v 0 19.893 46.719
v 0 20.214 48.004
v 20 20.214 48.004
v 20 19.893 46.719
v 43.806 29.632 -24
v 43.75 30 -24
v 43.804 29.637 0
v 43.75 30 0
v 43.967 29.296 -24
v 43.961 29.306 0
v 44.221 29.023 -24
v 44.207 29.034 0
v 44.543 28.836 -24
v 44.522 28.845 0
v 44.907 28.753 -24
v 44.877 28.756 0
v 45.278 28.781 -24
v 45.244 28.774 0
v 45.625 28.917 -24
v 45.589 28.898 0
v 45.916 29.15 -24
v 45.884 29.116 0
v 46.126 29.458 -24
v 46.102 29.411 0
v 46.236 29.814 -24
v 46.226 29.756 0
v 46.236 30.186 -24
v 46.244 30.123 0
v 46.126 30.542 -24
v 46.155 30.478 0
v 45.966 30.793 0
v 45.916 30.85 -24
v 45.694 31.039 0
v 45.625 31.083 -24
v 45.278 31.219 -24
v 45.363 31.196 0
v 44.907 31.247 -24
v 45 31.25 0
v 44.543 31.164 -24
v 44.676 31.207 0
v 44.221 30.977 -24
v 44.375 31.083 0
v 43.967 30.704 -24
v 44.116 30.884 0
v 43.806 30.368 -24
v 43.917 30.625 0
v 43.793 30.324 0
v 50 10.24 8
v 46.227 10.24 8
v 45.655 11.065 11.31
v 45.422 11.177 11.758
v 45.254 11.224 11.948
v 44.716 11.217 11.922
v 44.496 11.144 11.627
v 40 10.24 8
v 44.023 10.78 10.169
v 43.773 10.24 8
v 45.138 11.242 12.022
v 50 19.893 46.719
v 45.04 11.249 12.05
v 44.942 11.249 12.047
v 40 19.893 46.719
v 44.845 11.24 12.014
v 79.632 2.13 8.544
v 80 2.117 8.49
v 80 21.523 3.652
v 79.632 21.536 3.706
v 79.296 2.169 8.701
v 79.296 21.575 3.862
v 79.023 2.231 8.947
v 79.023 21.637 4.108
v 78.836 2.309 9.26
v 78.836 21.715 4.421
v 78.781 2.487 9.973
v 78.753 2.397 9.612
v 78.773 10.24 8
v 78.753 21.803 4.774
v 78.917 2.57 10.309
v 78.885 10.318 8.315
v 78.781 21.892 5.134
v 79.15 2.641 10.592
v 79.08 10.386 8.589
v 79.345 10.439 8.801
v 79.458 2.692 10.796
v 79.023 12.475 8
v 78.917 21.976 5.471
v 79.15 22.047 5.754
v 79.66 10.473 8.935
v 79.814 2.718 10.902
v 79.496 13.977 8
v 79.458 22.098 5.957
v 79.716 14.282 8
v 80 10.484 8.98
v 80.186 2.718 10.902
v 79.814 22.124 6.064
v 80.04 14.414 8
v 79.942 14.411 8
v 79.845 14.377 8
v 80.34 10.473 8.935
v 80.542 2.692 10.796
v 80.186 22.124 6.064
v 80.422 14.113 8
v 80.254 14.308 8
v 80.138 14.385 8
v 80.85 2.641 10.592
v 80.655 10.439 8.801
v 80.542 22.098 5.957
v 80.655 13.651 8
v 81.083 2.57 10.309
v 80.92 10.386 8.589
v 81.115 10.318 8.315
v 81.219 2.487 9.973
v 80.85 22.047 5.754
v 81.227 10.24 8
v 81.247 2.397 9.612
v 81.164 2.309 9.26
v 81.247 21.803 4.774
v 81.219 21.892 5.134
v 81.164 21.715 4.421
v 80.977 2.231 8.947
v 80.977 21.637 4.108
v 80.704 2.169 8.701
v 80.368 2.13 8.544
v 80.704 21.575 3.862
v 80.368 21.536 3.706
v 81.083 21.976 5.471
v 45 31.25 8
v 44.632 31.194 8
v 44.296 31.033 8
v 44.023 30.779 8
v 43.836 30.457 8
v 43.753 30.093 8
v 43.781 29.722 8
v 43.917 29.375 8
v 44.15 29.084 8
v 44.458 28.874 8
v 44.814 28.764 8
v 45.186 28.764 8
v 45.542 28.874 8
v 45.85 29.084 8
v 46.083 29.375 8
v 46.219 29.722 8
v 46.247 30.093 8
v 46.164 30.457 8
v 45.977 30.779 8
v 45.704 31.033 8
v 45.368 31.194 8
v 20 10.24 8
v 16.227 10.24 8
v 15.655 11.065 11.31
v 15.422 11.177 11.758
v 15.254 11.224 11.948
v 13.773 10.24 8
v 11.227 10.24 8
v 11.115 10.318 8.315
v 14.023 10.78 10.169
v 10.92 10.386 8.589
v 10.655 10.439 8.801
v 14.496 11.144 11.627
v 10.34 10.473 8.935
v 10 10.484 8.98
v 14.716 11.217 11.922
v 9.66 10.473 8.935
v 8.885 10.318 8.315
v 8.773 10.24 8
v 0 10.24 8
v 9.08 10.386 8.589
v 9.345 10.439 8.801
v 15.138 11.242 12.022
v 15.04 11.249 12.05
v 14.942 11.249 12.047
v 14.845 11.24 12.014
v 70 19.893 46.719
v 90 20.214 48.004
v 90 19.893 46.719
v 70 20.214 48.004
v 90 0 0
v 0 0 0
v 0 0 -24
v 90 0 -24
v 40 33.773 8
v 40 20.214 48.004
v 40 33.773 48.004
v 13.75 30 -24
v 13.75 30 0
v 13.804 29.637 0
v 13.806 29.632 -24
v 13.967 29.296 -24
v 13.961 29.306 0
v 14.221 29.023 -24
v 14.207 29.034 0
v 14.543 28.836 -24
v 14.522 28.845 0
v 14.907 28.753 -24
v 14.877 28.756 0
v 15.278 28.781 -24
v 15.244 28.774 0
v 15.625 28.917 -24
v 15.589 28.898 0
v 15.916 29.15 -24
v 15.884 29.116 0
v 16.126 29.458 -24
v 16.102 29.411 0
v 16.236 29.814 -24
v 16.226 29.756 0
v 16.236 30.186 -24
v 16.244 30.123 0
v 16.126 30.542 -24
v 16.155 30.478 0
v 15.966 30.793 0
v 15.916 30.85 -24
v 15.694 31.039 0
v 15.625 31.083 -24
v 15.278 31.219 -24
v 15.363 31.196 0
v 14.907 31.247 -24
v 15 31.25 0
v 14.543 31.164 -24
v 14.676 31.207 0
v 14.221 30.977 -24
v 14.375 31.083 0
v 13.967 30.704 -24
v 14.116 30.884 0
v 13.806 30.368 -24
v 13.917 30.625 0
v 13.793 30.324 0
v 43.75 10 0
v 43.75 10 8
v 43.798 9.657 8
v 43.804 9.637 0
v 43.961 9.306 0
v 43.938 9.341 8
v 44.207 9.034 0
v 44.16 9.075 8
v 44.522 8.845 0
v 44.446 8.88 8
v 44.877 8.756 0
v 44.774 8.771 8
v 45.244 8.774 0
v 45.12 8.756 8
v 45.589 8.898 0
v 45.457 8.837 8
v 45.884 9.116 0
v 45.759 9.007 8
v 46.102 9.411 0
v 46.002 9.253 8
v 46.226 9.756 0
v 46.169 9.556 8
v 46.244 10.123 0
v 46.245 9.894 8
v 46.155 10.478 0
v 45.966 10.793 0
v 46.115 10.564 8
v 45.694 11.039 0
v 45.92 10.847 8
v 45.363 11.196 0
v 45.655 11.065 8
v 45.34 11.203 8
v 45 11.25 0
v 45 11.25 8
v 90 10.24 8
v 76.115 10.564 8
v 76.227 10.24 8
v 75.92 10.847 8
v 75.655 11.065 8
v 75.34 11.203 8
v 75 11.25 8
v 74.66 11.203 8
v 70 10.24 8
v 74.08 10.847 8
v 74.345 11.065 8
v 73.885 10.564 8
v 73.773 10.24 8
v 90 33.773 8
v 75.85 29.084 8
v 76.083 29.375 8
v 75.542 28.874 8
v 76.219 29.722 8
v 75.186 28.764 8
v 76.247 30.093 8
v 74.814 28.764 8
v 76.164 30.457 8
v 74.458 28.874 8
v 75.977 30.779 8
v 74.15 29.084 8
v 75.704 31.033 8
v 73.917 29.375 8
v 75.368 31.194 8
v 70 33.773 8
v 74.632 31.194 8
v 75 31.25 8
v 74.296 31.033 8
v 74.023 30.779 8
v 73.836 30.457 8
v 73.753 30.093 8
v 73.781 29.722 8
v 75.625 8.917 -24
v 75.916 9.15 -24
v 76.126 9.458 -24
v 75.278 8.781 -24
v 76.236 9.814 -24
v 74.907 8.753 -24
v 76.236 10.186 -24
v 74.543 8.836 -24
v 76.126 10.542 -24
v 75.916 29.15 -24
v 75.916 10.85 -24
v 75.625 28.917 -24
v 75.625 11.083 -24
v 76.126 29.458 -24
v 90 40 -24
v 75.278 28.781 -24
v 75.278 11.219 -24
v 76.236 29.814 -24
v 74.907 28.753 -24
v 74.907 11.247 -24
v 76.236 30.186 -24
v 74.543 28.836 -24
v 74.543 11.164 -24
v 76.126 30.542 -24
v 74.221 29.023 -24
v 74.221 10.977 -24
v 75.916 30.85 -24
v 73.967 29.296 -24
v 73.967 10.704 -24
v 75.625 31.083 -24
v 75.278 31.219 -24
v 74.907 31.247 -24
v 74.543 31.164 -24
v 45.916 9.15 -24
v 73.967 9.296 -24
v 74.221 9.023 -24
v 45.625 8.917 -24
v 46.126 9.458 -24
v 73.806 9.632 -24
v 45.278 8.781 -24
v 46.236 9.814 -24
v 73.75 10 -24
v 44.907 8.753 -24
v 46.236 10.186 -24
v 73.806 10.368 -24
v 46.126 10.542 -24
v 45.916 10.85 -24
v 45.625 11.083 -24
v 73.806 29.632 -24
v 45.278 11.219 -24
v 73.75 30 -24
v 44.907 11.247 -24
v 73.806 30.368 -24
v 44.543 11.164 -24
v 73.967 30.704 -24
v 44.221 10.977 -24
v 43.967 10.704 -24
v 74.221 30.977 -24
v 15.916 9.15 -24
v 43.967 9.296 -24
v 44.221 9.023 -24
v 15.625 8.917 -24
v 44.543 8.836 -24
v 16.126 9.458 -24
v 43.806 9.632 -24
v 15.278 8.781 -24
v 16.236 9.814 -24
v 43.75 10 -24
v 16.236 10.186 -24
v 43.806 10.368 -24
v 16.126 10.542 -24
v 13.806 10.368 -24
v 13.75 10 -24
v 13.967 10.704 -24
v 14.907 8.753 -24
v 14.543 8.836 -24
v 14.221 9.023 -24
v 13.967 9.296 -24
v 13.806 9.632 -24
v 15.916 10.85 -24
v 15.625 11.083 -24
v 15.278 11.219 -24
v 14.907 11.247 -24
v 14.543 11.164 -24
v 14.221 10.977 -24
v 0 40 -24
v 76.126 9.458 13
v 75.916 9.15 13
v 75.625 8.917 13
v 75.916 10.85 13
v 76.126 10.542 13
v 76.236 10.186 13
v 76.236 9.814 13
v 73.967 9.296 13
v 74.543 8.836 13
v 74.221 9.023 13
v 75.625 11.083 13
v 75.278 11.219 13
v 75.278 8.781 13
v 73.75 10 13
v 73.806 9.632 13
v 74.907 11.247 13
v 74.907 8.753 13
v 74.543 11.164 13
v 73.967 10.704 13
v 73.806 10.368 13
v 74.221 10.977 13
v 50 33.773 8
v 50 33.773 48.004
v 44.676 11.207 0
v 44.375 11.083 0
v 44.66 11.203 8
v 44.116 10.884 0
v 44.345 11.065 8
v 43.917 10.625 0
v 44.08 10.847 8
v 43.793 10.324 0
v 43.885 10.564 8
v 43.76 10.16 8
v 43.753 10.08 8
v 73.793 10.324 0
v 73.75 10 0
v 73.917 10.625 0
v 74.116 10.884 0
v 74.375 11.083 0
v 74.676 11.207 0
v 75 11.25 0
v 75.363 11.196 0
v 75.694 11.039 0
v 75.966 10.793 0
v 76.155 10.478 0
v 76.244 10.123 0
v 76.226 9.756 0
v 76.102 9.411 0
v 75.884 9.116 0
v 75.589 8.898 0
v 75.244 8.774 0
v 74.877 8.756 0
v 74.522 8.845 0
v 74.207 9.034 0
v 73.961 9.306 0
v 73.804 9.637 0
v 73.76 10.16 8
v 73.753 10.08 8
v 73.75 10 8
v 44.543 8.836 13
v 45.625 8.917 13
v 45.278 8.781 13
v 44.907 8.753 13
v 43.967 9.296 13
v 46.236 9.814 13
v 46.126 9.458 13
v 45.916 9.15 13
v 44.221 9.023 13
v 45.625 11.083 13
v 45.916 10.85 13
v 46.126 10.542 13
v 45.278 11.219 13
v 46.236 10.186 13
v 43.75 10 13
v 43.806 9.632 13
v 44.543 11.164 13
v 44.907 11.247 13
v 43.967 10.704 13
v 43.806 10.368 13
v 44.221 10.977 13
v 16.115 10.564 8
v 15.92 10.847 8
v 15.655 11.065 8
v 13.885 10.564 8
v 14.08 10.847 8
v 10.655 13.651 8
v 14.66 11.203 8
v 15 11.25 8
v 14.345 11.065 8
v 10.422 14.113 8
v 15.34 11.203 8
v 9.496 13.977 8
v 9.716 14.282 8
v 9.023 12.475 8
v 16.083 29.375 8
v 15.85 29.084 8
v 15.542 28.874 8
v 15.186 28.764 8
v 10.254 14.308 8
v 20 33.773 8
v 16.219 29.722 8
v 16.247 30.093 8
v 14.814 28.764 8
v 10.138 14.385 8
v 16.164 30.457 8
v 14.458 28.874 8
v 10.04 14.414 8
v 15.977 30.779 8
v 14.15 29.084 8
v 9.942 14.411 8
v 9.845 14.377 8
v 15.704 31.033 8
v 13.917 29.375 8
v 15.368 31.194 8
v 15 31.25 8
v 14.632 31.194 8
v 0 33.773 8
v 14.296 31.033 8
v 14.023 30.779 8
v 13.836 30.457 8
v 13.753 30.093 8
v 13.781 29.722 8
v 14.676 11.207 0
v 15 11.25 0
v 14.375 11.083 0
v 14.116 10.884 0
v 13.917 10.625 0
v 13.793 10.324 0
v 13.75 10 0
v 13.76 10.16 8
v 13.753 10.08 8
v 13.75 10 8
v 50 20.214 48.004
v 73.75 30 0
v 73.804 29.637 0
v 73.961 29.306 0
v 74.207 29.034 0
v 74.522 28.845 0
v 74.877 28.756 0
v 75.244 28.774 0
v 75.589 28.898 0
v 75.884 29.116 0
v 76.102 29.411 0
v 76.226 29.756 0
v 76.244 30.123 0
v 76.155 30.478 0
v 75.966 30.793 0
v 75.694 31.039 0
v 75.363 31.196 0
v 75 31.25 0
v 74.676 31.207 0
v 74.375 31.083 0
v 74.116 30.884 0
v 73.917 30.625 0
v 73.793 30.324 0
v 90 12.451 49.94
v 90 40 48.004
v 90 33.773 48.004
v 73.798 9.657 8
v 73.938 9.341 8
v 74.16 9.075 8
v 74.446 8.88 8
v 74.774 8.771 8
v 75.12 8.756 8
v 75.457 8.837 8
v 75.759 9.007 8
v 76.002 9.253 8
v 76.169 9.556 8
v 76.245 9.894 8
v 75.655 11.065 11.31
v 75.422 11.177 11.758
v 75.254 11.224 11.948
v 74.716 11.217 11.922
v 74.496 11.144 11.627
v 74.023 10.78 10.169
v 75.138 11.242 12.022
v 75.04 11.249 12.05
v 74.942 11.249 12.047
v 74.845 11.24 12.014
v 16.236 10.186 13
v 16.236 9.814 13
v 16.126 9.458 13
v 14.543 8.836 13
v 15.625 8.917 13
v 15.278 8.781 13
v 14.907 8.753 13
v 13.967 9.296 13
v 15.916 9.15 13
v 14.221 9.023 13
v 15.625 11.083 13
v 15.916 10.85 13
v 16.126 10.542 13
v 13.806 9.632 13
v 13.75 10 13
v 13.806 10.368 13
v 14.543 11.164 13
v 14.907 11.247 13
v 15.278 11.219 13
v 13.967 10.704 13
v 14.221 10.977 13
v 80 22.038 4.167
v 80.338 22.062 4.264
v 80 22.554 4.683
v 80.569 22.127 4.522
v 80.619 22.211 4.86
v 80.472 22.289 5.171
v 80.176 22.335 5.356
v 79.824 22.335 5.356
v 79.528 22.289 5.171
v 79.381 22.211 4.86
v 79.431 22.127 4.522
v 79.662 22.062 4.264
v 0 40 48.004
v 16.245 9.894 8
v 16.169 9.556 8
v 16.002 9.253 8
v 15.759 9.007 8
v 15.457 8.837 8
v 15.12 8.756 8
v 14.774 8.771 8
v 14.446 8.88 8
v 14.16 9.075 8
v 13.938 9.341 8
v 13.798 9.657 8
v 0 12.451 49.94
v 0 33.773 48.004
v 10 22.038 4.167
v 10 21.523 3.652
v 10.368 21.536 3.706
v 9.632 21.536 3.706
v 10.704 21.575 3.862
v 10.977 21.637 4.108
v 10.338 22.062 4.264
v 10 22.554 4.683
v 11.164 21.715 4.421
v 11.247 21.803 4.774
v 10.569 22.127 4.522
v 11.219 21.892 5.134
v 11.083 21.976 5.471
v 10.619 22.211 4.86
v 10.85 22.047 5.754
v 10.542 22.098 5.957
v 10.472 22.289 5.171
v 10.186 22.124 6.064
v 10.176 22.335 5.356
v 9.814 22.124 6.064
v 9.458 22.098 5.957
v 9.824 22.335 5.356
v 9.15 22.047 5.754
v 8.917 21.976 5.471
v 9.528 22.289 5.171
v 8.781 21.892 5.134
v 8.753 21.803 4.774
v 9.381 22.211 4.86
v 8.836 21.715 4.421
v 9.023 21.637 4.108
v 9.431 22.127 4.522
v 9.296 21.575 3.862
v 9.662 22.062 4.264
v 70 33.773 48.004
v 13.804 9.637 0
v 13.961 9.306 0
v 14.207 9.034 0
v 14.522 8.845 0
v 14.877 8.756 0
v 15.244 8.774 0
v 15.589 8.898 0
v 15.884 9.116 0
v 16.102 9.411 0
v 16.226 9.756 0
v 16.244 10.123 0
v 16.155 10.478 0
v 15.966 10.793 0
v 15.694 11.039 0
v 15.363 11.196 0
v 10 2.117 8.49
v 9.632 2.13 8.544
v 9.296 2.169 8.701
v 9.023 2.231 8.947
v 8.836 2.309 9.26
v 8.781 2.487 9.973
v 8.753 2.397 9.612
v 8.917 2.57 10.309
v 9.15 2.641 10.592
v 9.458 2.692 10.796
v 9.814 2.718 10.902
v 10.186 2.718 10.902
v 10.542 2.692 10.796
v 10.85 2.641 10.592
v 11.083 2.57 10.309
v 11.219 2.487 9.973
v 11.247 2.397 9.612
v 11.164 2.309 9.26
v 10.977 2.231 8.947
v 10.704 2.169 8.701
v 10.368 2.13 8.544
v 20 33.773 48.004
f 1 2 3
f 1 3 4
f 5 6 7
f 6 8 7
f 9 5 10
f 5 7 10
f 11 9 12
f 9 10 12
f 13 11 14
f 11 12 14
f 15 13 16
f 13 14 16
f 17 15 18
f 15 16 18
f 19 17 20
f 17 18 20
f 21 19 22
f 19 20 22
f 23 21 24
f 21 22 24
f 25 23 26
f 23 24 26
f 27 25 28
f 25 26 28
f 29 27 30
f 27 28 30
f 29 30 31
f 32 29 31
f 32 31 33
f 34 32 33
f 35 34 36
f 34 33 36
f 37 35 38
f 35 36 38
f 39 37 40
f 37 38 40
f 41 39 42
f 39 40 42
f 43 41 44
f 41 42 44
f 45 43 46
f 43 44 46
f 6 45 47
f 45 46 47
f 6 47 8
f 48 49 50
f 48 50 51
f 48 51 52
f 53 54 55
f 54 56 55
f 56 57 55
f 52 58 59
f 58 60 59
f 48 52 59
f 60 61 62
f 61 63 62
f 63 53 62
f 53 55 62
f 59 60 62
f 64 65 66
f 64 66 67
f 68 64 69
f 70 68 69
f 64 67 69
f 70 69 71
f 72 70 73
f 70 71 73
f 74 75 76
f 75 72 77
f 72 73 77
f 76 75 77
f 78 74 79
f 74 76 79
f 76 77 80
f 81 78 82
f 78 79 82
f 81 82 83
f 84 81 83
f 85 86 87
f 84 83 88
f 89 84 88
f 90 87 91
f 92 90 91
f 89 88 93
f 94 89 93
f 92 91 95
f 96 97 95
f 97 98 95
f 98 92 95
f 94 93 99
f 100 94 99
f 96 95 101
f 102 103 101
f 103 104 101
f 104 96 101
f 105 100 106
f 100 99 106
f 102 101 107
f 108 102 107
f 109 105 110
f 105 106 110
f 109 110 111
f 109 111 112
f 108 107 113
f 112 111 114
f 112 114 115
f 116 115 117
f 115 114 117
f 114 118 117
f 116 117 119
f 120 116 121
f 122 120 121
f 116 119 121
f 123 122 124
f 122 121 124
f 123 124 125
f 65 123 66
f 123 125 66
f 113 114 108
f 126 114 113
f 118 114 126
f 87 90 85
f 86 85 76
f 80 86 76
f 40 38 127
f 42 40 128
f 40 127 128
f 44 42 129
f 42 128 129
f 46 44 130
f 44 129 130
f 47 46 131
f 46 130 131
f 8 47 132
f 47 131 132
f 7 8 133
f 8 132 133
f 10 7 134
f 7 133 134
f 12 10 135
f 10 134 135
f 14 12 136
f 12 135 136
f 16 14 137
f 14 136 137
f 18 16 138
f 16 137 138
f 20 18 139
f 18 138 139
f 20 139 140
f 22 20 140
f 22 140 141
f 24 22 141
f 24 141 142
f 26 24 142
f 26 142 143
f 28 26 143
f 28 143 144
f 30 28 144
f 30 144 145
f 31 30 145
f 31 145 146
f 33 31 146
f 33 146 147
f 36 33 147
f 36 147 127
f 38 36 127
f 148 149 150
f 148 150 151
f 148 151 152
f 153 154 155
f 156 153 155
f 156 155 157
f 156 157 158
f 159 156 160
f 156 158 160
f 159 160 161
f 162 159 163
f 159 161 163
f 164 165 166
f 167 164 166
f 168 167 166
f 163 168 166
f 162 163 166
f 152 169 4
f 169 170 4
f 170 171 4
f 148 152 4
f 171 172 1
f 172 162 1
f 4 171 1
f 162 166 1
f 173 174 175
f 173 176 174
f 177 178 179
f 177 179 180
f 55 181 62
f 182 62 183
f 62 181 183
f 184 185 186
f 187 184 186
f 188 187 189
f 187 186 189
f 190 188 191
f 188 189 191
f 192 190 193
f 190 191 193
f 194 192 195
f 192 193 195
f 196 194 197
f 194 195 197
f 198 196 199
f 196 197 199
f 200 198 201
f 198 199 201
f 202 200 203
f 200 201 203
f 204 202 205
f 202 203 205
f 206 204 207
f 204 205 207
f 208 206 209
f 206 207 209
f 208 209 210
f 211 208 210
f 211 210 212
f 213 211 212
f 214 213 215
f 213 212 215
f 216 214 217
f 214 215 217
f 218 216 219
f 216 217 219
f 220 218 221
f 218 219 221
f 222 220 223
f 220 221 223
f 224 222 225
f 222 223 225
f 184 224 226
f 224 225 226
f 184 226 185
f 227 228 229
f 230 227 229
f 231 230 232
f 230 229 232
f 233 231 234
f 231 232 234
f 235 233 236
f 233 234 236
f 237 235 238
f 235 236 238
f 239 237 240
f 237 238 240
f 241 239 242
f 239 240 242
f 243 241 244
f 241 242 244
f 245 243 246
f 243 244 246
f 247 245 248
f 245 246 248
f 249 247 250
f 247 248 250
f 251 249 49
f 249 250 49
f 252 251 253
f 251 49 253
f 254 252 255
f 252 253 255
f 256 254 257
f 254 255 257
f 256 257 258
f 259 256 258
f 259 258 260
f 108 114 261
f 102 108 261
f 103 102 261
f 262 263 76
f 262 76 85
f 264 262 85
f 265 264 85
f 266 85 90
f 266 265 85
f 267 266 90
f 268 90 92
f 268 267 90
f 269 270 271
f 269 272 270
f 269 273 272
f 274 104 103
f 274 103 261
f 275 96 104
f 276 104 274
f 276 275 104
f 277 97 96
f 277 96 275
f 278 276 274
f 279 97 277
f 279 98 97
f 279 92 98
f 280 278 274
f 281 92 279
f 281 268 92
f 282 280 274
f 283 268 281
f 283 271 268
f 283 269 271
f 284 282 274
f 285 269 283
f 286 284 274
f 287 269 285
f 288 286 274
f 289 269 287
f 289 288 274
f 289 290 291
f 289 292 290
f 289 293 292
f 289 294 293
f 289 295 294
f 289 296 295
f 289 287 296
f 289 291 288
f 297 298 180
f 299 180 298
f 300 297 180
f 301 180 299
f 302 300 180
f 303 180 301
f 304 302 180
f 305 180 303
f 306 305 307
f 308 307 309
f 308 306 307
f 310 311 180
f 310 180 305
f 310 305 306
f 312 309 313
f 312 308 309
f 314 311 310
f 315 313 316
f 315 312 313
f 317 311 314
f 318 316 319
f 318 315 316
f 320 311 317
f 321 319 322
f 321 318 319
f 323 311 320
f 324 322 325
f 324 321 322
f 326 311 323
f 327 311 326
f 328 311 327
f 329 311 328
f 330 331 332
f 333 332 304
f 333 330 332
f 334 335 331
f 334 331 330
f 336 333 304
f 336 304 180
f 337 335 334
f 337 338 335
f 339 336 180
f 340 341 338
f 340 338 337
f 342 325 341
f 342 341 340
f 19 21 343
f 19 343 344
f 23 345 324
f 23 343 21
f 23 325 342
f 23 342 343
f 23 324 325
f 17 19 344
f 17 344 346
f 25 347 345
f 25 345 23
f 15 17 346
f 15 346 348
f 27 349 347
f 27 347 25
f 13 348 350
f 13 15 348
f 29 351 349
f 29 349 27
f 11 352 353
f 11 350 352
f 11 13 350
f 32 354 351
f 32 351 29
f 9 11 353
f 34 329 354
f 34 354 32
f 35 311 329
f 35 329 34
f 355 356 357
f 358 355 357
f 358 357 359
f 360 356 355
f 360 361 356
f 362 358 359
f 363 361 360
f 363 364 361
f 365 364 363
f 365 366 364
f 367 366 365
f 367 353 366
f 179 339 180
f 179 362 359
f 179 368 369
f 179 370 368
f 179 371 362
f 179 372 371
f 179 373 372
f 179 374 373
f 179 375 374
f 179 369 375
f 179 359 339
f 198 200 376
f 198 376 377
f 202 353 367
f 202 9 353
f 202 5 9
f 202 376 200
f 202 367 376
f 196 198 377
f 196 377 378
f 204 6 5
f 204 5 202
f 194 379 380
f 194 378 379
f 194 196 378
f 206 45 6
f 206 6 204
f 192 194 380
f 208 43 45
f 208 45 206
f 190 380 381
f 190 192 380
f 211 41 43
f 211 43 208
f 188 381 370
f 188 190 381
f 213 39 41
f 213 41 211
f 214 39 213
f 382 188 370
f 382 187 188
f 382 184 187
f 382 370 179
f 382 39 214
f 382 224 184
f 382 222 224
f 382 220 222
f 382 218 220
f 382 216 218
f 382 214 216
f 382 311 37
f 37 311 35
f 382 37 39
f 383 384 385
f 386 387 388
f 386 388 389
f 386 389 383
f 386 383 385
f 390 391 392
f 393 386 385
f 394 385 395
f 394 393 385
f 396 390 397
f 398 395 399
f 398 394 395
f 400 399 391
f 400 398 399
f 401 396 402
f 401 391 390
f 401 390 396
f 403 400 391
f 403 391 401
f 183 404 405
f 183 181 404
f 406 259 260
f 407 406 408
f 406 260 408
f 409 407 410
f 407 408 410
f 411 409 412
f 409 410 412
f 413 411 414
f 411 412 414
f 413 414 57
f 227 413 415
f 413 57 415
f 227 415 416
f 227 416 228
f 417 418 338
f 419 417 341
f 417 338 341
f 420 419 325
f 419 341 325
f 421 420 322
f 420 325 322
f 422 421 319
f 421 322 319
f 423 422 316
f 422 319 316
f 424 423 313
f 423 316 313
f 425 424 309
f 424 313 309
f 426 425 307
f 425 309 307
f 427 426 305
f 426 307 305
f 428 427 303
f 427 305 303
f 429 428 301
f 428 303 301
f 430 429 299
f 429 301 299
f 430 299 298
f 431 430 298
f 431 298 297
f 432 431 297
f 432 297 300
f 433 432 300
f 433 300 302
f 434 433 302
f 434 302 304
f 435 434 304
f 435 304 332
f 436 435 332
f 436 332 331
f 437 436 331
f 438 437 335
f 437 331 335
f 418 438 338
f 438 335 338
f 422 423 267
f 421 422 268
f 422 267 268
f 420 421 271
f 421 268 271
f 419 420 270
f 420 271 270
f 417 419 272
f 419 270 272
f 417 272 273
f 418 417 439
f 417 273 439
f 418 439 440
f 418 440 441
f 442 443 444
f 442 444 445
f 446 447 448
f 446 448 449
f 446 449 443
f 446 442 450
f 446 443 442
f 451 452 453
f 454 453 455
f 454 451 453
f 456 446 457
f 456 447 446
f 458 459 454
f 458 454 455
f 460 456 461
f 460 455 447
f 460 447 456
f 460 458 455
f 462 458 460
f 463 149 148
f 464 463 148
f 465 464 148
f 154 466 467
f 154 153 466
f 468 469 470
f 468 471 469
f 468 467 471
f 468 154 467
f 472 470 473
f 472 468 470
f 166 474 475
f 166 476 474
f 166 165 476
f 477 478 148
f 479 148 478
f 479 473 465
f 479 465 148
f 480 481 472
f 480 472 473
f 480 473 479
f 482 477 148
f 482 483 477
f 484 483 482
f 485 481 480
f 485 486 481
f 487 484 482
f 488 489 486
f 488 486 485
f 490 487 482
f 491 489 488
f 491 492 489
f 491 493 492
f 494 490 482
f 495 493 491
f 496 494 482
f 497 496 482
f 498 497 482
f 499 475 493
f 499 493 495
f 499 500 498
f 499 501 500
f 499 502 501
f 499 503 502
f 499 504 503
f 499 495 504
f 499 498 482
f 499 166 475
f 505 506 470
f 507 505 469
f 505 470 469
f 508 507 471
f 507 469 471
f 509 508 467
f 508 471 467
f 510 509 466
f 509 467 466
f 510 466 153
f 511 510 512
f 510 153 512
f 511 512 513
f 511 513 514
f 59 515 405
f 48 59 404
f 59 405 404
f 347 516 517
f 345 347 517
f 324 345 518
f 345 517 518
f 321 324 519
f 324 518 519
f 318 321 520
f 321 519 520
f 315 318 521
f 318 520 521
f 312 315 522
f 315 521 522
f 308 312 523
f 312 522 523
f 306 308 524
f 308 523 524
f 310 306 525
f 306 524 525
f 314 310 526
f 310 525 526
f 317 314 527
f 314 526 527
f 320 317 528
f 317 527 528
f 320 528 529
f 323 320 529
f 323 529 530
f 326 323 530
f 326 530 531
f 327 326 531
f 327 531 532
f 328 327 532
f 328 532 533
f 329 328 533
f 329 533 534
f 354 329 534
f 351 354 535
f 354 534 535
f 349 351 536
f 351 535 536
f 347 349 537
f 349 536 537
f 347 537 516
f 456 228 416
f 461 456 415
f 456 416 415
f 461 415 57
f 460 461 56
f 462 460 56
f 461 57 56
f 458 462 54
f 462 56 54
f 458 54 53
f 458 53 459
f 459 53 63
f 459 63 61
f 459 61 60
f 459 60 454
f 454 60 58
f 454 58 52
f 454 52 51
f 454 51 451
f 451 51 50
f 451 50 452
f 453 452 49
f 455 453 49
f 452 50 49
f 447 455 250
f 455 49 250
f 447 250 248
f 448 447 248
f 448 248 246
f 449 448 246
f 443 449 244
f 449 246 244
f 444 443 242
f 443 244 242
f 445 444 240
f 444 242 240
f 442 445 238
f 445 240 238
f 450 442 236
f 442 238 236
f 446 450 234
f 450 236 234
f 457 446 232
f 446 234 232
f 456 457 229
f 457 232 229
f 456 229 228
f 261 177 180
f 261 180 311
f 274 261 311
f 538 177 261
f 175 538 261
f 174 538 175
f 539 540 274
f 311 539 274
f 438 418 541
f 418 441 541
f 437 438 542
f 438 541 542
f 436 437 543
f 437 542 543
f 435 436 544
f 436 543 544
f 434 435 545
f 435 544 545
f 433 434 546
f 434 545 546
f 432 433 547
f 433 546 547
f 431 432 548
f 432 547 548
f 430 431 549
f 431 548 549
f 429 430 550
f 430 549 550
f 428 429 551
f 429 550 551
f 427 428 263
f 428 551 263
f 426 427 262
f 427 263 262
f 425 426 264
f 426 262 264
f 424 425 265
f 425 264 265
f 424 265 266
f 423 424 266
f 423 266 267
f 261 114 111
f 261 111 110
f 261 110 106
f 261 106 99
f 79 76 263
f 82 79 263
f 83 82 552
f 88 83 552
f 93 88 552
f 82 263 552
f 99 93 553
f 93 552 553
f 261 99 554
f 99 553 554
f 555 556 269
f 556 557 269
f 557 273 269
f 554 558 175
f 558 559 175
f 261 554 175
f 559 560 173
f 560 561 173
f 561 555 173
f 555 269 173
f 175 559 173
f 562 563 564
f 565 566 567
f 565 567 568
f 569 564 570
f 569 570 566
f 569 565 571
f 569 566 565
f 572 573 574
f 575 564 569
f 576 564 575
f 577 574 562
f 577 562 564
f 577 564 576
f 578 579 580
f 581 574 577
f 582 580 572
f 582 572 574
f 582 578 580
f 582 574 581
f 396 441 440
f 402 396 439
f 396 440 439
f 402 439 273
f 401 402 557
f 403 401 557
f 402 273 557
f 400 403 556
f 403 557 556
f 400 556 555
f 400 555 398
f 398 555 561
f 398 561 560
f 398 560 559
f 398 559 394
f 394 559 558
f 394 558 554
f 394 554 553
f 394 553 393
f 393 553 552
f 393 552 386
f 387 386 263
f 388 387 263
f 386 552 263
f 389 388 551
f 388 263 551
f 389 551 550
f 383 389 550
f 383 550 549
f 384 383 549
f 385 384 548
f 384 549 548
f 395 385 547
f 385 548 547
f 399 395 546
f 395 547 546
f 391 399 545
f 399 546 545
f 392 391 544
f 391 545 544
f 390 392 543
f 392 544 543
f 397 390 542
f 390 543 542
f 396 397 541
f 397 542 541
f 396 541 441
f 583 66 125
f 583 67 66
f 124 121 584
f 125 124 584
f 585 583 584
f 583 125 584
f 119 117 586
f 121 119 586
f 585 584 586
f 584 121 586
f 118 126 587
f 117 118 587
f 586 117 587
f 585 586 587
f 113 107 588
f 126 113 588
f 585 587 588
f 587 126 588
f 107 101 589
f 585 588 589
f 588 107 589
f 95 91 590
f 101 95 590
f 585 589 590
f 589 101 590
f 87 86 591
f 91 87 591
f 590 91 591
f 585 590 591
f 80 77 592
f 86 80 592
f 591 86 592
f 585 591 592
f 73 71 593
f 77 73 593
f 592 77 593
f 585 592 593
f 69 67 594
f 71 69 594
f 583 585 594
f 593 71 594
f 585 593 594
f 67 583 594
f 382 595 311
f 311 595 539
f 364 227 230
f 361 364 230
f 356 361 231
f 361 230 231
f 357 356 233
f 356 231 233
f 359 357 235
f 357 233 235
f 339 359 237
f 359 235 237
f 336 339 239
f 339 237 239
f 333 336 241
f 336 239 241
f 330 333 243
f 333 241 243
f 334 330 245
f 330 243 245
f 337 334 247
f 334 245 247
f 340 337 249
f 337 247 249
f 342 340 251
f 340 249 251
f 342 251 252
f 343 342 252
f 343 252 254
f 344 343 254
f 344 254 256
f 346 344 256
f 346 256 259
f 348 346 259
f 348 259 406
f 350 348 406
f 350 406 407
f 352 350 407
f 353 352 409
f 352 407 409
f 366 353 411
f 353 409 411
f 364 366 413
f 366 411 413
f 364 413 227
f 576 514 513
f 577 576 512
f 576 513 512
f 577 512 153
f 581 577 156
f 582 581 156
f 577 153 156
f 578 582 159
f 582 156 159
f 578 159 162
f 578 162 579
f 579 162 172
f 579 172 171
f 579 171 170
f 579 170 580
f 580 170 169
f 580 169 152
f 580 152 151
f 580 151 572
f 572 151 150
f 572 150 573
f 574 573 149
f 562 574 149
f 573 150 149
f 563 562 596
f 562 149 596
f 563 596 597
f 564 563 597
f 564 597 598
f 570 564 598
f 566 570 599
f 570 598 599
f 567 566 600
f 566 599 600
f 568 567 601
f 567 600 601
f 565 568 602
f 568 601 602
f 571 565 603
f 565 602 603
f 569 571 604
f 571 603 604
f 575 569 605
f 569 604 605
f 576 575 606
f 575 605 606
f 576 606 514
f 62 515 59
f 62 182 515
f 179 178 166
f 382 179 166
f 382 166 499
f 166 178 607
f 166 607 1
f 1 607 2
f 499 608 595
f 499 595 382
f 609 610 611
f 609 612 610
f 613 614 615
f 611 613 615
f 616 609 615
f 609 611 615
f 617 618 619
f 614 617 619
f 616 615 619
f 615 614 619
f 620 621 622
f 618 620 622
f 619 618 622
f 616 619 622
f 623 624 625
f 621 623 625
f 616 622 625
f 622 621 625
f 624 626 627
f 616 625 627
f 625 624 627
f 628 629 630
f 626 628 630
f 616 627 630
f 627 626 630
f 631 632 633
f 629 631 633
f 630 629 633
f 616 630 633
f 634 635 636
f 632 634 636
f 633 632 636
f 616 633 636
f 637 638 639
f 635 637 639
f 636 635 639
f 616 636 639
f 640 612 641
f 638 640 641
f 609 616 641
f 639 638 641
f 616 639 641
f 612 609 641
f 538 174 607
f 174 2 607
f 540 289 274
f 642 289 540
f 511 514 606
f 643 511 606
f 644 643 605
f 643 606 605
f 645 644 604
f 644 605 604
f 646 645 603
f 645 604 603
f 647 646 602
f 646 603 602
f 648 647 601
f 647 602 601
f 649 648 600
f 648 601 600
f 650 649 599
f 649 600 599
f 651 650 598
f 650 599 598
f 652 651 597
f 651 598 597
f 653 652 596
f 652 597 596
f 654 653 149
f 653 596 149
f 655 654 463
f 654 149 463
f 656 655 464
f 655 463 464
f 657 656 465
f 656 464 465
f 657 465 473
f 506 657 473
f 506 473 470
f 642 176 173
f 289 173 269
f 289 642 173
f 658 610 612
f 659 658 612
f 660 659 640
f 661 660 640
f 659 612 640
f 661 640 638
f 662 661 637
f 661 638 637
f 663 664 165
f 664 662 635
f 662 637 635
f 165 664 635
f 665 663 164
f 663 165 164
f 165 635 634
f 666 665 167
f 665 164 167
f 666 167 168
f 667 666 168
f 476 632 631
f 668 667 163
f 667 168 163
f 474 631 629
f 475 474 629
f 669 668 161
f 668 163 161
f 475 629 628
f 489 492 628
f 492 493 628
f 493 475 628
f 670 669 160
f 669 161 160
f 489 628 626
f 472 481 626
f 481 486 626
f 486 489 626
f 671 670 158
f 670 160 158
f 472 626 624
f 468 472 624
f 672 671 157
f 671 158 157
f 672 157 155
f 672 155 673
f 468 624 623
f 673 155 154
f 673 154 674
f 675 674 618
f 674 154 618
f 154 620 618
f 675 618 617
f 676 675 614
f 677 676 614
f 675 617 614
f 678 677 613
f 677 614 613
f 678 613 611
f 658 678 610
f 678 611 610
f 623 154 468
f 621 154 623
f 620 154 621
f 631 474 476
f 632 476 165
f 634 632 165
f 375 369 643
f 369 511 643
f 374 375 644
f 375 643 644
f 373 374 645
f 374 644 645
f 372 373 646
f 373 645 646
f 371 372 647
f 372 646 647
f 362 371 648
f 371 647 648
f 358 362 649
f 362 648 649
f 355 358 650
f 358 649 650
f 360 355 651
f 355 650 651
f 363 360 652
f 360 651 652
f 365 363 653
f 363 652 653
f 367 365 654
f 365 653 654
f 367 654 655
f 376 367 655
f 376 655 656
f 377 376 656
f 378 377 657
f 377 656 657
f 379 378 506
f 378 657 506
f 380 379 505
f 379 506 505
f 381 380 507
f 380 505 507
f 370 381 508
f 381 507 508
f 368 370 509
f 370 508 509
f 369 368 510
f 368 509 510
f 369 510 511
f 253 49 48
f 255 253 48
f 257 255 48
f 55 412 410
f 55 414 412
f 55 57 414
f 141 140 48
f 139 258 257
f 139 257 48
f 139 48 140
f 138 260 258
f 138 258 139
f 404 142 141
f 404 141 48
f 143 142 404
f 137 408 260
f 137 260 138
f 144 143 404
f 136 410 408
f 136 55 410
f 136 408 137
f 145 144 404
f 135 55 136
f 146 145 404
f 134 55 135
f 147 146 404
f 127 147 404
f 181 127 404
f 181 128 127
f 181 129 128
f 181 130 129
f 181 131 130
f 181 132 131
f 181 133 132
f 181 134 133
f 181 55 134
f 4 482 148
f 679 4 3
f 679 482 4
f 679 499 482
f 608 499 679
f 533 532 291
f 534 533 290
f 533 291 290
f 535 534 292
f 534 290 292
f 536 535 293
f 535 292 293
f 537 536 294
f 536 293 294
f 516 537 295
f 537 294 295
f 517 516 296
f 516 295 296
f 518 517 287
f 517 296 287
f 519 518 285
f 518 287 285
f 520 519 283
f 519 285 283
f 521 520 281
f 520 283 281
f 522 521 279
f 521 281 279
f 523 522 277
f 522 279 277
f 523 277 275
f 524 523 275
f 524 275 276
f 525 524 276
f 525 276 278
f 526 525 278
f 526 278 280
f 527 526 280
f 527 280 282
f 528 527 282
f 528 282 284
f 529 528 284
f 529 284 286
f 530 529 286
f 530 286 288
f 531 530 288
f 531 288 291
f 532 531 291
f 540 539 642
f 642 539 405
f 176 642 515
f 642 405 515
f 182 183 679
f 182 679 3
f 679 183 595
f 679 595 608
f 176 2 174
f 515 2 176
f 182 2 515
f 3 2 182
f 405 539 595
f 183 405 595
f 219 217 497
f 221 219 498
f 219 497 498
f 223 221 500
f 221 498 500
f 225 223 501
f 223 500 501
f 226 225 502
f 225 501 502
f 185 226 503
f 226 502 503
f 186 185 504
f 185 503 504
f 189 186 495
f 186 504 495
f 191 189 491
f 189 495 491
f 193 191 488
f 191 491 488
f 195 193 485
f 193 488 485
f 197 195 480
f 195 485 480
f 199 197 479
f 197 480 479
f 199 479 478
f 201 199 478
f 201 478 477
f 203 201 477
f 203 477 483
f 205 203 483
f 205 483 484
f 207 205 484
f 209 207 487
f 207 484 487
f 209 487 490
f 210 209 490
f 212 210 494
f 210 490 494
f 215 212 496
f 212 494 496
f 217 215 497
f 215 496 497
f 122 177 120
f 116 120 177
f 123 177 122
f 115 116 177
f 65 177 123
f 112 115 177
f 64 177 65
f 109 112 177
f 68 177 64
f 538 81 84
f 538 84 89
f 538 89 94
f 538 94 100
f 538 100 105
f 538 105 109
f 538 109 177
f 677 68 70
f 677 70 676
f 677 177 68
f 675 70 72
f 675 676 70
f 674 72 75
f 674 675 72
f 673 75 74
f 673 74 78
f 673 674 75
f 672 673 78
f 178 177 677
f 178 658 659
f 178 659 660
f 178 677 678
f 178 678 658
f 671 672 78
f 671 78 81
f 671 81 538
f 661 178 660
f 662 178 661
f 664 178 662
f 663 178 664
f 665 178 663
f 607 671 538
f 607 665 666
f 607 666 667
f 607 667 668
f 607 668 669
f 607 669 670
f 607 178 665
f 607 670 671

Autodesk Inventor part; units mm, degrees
ref_plane "YZ Plane" through (0, 0, 0) normal (1, 0, 0) x (0, 1, 0)
ref_plane "XZ Plane" through (0, 0, 0) normal (0, 1, 0) x (-1, 0, 0)
sketch "スケッチ1" plane through (0, 0, 0) normal (1, 0, 0) x (0, 1, 0)
  line L0 (0, 0) -> (19.3538, 77.6237)
  line L1 (0, 0) -> (80, 0) construction
  line L2 (19.3538, 77.6237) -> (20.7024, 0.3614)
  line L3 (20.7024, 0.3614) -> (0, 0)
  line L4 (0, 0) -> (20.7024, 0.3614)
  line L5 (0, 0) -> (40, 0)
  line L6 (40, 0) -> (40, 77.6237)
  line L7 (40, 77.6237) -> (19.3538, 77.6237)
  dimension "d0" = 80
  dimension "d1" = 76
  dimension "d2" = 15
  dimension "d44" = 40
extrude "押し出し1" add sketch "スケッチ1" along normal blind 90
sketch "スケッチ2" plane through (0, 0, 0) normal (0, -0.9703, 0.2419) x (1, 0, 0)
  line L0 (0, 80) -> (10, 80)
  line L1 (10, 80) -> (10, 70)
  line L2 (10, 70) -> (0, 70)
  line L3 (0, 70) -> (0, 80)
  line L4 (90, 80) -> (80, 80)
  line L5 (80, 80) -> (80, 70)
  line L6 (80, 70) -> (90, 70)
  line L7 (90, 70) -> (90, 80)
  line L8 (90, 0) -> (80, 0)
  line L9 (80, 0) -> (80, 10)
  line L10 (80, 10) -> (90, 10)
  line L11 (90, 10) -> (90, 0)
  line L12 (0, 0) -> (10, 0)
  line L13 (10, 0) -> (10, 10)
  line L14 (10, 10) -> (0, 10)
  line L15 (0, 10) -> (0, 0)
  dimension "d5" = 10
  dimension "d6" = 10
  dimension "d7" = 10
  dimension "d8" = 10
  dimension "d9" = 10
  dimension "d10" = 10
  dimension "d11" = 10
  dimension "d12" = 10
hole "穴1" at (10, 16.9345, 67.9207) at (10, 2.4192, 9.703) at (80, 2.4192, 9.703) at (80, 16.9345, 67.9207) direction (0, 0.9703, -0.2419) diameter 2.5 depth 20 tip angle 118
sketch "スケッチ4" plane through (90, 0, 0) normal (1, 0, 0) x (0, 0, -1)
  line L0 (-77.6237, 19.3538) -> (0, 0) projected
  line L1 (0, 0) -> (0, 20.7055) projected
  line L2 (-8, 20.7055) -> (-8, 1.9946)
  line L3 (0, 12.7075) -> (-47.6322, 11.876)
  line L4 (-46.7187, 19.8932) -> (0, 8.2449)
  line L5 (-77.6237, 40) -> (-77.6237, 19.3538) projected
  line L6 (-46.7187, 19.8932) -> (-70.3029, 25.7734)
  line L7 (-70.3029, 25.7734) -> (-70.3029, 33.7734)
  line L8 (-70.3029, 33.7734) -> (-8, 33.7734)
  line L9 (-8, 33.7734) -> (-8, 20)
  point P0 (-16.7273, 12.4155)
  point P1 (-8, 12.5678)
  point P2 (-8, 10.2395)
  dimension "d34" = 8
  dimension "d36" = 8
  dimension "d45" = 8
ref_plane "作業平面1" through (45, 0, 0) normal (-1, 0, 0) x (0, 0, 1)
extrude "押し出し4" cut sketch "スケッチ4" against normal blind 45 contours L4 L6 L7 L8 L9 L2 L3 | L3 L2 L4
mirror "ミラー1" about plane through (45, 0, 0) normal (-1, 0, 0) of "押し出し4"
sketch "スケッチ6" plane through (0, 0, 0) normal (0, 0, -1) x (-1, 0, 0)
  line L0 (-90, 40) -> (-75, 40)
  line L1 (-75, 40) -> (-75, 30)
  line L2 (-75, 30) -> (-90, 30)
  line L3 (-90, 30) -> (-90, 40)
  line L4 (-90, 0) -> (-75, 0)
  line L5 (-75, 0) -> (-75, 10)
  line L6 (-75, 10) -> (-90, 10)
  line L7 (-90, 10) -> (-90, 0)
  line L8 (0, 40) -> (-15, 40)
  line L9 (-15, 40) -> (-15, 30)
  line L10 (-15, 30) -> (0, 30)
  line L11 (0, 30) -> (0, 40)
  line L12 (0, 0) -> (-15, 0)
  line L13 (-15, 0) -> (-15, 10)
  line L14 (-15, 10) -> (0, 10)
  line L15 (0, 10) -> (0, 0)
  point P0 (-45, 30)
  point P1 (-45, 10)
  dimension "d49" = 15
  dimension "d50" = 10
  dimension "d51" = 10
  dimension "d52" = 15
  dimension "d53" = 10
  dimension "d54" = 10
hole "穴3" at (45, 30, 0) at (45, 10, 0) at (15, 10, 0) at (15, 30, 0) at (75, 30, 0) at (75, 10, 0) direction (0, 0, 1) diameter 2.5 depth 8 tip angle 118
sketch "スケッチ7" plane through (90, 0, 0) normal (1, 0, 0) x (0, 0, -1)
  line L0 (-70.3029, 33.7734) -> (-8, 33.7734) projected
  line L1 (-8, 33.7734) -> (-8, 10.2395) projected
  line L2 (-8, 10.2395) -> (-70.3029, 25.7734) projected
  line L3 (-70.3029, 25.7734) -> (-70.3029, 33.7734) projected
  line L4 (0, 0) -> (0, 40) projected
  line L5 (0, 40) -> (-77.6237, 40) projected
  line L6 (-77.6237, 40) -> (-77.6237, 19.3538) projected
  line L7 (-77.6237, 19.3538) -> (0, 0) projected
ref_plane "作業平面2" through (70, 0, 0) normal (1, 0, 0) x (0, 0, -1)
sketch "スケッチ8" plane through (70, 0, 0) normal (1, 0, 0) x (0, 0, -1)
  line L0 (-5.9326, 37.4868) -> (-71.6084, 37.4868)
  line L1 (-71.6084, 37.4868) -> (-71.6084, 19.3326)
  line L2 (-28.0915, 7.5857) -> (-5.9326, 7.5857)
  line L3 (-5.9326, 7.5857) -> (-5.9326, 37.4868)
  line L4 (-28.0915, 7.5857) -> (-71.6084, 19.3326)
  point P0 (0, 0)
extrude "押し出し5" add sketch "スケッチ8" against normal blind 20
ref_plane "作業平面3" through (20, 0, 0) normal (-1, 0, 0) x (0, 0, 1)
sketch "スケッチ9" plane through (20, 0, 0) normal (-1, 0, 0) x (0, 0, 1)
  line L0 (5.473, 36.709) -> (72.4836, 36.709)
  line L1 (72.4836, 36.709) -> (72.4836, 22.6929)
  line L2 (20.9575, 8.6767) -> (5.473, 8.6767)
  line L3 (5.473, 8.6767) -> (5.473, 36.709)
  line L4 (20.9575, 8.6767) -> (72.4836, 22.6929)
  point P0 (0, 0)
extrude "押し出し6" add sketch "スケッチ9" against normal blind 20
sketch "スケッチ10" plane through (0, 0, 0) normal (-1, 0, 0) x (0, 0, 1)
  line L0 (77.6237, 40) -> (48.0044, 40)
  line L1 (50.463, 10.3528) -> (77.6237, 10.3528)
  line L2 (77.6237, 10.3528) -> (77.6237, 40)
  line L3 (70.3029, 25.7734) -> (8, 10.2395) projected
  line L4 (77.6237, 19.3538) -> (0, 0) projected
  line L5 (48.0044, 20.2137) -> (49.9397, 12.4514)
  line L6 (49.9397, 12.4514) -> (50.463, 10.3528)
  line L7 (48.0044, 40) -> (48.0044, 20.2137)
  line L8 (47.6237, 11.8739) -> (47.6237, 10.3528)
  dimension "d68" = 30
extrude "押し出し7" cut sketch "スケッチ10" against normal blind 100
sketch "スケッチ11" plane through (0, 0, 0) normal (0, 0, -1) x (-1, 0, 0)
  circle A0 centre (-75, 30) radius 1.25 projected
  circle A1 centre (-15, 10) radius 1.25 projected
  circle A2 centre (-45, 30) radius 1.25 projected
  circle A3 centre (-45, 10) radius 1.25 projected
  circle A4 centre (-15, 30) radius 1.25 projected
  circle A5 centre (-75, 10) radius 1.25 projected
  line L0 (0, 0) -> (0, 40) projected
  line L1 (0, 40) -> (-90, 40) projected
  line L2 (-90, 0) -> (-90, 40) projected
  line L3 (0, 0) -> (-90, 0) projected
extrude "押し出し8" add sketch "スケッチ11" along normal blind 24
sketch "スケッチ12" plane through (0, 0, -24) normal (0, 0, -1) x (-1, 0, 0)
  circle A0 centre (-75, 10) radius 1.25 projected
  circle A1 centre (-45, 10) radius 1.25 projected
  circle A2 centre (-15, 10) radius 1.25 projected
extrude "押し出し9" cut sketch "スケッチ12" against normal blind 37
properties part number "知能ロボコン土台1.1"
